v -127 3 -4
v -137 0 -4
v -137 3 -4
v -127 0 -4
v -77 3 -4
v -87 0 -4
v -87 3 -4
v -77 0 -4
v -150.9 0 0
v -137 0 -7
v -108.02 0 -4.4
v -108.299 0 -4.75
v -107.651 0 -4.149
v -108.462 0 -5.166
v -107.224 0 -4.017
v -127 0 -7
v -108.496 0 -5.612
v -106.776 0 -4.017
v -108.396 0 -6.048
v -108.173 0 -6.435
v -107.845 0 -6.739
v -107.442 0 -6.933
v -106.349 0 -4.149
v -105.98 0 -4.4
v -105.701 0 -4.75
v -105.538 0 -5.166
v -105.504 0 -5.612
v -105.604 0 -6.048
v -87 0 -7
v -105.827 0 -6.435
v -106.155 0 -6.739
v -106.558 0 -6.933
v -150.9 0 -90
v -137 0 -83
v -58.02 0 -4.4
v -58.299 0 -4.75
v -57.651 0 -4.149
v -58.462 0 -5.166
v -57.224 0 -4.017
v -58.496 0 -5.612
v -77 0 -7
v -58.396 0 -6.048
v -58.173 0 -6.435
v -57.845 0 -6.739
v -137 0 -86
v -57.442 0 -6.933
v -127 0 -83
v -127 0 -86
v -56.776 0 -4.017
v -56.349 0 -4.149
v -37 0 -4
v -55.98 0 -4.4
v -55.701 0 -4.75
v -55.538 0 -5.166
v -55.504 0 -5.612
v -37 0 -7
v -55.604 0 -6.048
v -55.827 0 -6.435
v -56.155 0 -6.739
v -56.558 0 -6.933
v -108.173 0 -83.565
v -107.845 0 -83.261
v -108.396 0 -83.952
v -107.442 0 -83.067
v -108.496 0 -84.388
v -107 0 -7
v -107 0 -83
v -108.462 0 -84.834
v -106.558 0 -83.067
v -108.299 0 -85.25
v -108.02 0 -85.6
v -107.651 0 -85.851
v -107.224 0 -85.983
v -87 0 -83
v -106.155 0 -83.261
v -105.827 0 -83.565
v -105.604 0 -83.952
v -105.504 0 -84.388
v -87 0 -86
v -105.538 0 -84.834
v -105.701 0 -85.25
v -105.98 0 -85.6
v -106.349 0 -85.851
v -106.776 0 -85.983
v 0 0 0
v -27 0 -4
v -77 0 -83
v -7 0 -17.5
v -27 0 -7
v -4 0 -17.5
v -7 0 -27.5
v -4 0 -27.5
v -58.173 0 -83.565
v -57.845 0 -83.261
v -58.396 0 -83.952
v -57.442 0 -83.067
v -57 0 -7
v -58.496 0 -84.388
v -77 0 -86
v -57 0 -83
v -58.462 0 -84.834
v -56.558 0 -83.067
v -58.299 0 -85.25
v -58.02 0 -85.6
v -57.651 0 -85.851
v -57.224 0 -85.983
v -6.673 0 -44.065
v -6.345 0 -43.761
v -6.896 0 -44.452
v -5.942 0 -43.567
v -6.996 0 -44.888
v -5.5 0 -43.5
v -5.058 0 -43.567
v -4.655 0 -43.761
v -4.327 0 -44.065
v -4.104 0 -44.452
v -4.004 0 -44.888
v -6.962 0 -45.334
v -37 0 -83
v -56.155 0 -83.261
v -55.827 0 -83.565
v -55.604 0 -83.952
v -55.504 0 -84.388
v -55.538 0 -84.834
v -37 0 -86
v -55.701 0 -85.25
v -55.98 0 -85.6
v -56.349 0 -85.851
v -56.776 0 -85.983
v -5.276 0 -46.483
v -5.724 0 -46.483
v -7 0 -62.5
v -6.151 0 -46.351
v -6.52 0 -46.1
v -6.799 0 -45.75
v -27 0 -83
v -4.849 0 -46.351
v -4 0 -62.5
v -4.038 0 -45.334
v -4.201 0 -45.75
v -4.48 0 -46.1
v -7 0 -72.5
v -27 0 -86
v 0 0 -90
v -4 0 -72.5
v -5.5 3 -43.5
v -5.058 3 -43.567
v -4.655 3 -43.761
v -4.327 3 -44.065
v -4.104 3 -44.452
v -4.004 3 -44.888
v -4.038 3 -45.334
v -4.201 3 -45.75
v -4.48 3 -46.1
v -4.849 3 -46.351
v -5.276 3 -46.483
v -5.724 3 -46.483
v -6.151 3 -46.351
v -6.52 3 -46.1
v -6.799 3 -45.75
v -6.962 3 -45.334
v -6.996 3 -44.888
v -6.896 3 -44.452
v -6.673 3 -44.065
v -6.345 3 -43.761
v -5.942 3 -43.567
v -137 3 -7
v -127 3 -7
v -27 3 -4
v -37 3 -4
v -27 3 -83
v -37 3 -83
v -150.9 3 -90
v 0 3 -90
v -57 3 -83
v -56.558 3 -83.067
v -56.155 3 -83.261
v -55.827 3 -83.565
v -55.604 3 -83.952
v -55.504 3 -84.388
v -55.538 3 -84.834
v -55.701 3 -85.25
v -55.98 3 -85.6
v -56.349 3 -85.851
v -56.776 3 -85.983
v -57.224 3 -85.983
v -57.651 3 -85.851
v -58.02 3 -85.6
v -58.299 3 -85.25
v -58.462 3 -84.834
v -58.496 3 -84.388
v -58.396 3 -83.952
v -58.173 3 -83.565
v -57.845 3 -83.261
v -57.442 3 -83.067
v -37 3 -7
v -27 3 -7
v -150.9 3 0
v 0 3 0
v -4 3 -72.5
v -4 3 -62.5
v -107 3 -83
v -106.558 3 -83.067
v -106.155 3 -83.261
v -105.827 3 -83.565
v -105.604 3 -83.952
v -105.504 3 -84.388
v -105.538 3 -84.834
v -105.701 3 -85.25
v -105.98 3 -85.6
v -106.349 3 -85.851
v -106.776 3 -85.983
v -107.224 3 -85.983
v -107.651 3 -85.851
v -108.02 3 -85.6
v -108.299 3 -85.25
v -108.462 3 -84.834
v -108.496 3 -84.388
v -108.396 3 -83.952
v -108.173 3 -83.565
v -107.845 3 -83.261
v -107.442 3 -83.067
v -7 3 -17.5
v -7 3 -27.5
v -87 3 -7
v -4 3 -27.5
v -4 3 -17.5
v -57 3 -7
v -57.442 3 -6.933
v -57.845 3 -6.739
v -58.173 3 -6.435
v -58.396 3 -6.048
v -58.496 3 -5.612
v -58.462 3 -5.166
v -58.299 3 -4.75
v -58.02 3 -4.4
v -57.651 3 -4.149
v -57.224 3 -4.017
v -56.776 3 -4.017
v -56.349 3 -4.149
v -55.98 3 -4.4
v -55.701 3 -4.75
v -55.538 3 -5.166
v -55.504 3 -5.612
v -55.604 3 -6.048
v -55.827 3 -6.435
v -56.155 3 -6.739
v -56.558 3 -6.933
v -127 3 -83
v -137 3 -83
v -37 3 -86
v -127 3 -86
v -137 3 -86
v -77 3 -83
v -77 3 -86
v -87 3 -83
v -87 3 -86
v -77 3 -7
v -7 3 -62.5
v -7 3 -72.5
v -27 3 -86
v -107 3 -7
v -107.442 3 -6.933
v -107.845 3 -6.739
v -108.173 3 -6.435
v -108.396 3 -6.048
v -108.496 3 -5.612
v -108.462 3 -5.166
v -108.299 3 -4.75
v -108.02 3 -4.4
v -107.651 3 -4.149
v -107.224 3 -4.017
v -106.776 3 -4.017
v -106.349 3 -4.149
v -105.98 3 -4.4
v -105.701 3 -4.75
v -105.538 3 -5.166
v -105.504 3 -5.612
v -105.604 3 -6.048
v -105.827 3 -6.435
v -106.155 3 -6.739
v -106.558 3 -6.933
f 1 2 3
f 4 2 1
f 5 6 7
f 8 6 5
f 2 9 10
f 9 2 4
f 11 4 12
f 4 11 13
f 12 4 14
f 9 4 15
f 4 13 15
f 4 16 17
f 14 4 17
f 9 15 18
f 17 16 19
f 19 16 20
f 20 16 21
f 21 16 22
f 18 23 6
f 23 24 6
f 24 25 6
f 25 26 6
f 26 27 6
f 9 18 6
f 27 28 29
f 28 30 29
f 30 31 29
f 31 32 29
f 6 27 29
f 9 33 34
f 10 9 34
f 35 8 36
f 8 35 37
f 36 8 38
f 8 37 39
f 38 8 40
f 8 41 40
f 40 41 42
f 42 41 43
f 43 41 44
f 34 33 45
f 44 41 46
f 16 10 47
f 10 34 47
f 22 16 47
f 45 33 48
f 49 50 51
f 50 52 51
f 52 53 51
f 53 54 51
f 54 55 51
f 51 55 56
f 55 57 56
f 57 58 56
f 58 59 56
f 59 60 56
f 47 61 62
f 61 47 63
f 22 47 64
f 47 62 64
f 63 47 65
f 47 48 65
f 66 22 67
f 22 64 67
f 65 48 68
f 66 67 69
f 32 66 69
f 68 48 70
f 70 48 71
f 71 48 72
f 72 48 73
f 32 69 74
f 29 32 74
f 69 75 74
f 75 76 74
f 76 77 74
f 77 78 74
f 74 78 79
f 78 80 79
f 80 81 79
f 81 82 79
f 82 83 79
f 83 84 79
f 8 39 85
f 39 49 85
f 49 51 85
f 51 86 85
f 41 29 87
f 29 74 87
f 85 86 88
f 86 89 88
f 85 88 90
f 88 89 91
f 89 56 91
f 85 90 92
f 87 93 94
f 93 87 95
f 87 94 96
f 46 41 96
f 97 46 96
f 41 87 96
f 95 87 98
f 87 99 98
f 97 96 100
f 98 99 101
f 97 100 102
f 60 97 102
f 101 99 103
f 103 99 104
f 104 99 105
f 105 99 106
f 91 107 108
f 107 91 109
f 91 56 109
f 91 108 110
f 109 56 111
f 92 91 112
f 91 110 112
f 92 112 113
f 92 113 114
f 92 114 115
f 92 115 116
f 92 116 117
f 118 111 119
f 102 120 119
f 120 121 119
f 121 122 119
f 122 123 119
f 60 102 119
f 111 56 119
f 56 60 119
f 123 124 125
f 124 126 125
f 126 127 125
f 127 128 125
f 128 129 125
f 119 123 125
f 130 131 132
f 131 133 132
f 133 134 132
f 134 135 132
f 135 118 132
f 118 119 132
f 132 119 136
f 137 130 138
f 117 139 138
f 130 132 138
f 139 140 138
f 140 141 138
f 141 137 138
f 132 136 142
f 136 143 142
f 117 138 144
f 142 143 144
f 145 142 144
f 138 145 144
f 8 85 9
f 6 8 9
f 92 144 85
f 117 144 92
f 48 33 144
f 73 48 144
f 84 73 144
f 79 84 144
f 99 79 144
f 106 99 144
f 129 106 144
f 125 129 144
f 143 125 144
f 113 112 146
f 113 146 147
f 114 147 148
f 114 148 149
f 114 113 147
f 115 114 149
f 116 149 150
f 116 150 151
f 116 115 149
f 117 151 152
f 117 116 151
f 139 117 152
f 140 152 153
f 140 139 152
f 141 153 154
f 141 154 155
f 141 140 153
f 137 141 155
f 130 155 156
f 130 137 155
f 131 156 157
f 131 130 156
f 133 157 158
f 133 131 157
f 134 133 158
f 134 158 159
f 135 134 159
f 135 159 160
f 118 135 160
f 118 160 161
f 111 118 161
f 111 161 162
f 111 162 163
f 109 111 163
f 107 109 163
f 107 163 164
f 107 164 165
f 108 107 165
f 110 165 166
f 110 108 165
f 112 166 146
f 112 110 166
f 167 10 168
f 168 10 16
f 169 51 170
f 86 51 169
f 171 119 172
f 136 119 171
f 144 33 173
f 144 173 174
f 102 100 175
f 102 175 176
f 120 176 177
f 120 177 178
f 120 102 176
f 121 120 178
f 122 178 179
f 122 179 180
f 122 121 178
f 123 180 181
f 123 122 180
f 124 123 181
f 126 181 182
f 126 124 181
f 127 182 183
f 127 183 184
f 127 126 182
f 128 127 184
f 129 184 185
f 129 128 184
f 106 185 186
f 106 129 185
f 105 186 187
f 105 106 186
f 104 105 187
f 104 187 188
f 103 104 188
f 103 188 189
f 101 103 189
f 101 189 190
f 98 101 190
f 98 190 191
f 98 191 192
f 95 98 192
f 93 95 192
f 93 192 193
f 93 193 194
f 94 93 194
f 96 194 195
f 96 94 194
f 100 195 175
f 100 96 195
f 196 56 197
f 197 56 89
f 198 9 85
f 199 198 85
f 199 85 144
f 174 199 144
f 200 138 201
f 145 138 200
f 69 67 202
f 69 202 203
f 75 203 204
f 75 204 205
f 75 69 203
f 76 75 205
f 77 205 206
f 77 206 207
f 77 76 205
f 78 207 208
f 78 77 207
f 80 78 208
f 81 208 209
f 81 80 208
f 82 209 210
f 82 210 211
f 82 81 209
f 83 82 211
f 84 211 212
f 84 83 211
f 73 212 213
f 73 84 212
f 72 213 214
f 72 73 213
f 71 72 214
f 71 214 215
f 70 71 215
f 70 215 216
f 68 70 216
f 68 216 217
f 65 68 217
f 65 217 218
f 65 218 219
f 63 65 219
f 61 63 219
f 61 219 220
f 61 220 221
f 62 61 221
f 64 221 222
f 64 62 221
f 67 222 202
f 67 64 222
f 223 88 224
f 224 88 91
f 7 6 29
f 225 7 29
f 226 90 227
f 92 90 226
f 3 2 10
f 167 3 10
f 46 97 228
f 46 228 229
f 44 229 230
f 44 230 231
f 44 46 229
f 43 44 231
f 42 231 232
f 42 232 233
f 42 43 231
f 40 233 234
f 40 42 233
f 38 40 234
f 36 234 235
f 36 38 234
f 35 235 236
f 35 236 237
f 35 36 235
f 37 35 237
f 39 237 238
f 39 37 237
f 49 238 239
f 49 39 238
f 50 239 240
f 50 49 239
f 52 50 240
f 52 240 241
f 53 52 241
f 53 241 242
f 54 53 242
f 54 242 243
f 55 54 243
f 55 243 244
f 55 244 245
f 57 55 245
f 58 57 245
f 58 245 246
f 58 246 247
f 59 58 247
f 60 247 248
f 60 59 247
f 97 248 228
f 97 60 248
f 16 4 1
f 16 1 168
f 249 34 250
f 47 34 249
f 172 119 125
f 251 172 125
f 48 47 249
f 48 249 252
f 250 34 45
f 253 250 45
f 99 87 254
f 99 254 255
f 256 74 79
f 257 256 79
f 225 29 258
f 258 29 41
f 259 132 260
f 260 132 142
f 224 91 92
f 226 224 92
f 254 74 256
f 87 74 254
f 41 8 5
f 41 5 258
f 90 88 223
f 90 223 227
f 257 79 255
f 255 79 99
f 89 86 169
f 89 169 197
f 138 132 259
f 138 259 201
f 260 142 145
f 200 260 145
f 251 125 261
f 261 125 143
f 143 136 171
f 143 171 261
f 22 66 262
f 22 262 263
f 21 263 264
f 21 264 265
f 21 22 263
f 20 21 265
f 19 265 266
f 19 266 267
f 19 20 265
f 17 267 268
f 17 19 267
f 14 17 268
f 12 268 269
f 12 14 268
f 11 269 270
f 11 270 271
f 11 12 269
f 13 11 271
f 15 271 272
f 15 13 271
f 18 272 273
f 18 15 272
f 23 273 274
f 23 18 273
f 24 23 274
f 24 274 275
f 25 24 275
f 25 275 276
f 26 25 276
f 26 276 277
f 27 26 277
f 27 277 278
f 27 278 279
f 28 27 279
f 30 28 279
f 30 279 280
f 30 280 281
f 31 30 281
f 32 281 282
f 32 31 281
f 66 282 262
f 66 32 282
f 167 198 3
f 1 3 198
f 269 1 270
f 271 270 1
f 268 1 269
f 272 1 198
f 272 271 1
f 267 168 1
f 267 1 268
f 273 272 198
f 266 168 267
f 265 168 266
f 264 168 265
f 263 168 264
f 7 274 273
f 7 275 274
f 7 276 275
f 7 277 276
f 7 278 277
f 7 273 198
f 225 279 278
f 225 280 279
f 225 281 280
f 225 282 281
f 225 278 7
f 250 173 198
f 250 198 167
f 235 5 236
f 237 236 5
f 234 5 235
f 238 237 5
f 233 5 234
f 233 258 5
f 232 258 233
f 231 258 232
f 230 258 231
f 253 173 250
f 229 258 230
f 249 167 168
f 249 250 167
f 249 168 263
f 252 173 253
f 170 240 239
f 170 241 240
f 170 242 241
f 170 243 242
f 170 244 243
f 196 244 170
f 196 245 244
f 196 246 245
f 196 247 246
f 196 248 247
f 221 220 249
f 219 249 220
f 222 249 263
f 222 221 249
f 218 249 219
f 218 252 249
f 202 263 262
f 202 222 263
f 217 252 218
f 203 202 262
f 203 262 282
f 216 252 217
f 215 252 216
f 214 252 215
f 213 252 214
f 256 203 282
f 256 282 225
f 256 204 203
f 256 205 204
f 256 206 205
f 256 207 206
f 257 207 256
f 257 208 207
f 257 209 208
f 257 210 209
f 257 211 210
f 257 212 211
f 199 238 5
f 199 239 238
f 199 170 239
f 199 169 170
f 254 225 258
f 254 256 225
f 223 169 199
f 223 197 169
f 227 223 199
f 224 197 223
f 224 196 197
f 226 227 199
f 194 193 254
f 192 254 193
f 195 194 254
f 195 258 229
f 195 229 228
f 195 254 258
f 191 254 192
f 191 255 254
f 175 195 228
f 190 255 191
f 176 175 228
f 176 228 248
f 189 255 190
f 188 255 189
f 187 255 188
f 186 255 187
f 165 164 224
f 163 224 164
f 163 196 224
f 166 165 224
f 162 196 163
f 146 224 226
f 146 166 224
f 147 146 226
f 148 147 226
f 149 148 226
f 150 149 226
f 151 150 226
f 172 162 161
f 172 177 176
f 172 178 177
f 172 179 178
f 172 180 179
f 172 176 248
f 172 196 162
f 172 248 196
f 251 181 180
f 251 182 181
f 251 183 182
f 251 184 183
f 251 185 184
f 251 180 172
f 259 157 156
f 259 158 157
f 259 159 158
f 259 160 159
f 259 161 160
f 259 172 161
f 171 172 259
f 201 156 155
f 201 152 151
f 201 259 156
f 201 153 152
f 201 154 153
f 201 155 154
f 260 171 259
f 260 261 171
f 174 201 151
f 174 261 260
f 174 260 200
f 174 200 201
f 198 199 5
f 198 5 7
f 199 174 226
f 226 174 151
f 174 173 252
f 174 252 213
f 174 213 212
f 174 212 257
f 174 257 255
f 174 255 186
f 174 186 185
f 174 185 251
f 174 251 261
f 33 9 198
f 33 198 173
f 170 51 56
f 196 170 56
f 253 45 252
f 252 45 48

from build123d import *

# Parameters (mm, degrees)
SKETCH1_W           = 150.9
SKETCH1_H           = 90
SKETCH1_R           = 1.5
SKETCH1_W_2         = 10
SKETCH1_H_2         = 3
SKETCH1_W_3         = 3
SKETCH1_H_3         = 10
BOSS_EXTRUDE1_DEPTH = 3


with BuildPart() as part:
    # Sketch1 → Boss-Extrude1 (new body)
    with BuildSketch(Plane(origin=(0, 0, 0), x_dir=(1, 0, 0), z_dir=(0, 1, 0))):
        with Locations((-75.45, 45)):
            Rectangle(SKETCH1_W, SKETCH1_H)
        with Locations(Location((-57, 84.5, 0), (0, 0, 270))):
            Circle(SKETCH1_R, mode=Mode.SUBTRACT)
        with Locations(Location((-107, 84.5, 0), (0, 0, 270))):
            Circle(SKETCH1_R, mode=Mode.SUBTRACT)
        with Locations(Location((-107, 5.5, 0), (0, 0, 90))):
            Circle(SKETCH1_R, mode=Mode.SUBTRACT)
        with Locations(Location((-57, 5.5, 0), (0, 0, 90))):
            Circle(SKETCH1_R, mode=Mode.SUBTRACT)
        with Locations(Location((-5.5, 45, 0), (0, 0, 270))):
            Circle(SKETCH1_R, mode=Mode.SUBTRACT)
        with Locations((-32, 84.5)):
            Rectangle(SKETCH1_W_2, SKETCH1_H_2, mode=Mode.SUBTRACT)
        with Locations((-82, 84.5)):
            Rectangle(SKETCH1_W_2, SKETCH1_H_2, mode=Mode.SUBTRACT)
        with Locations((-132, 84.5)):
            Rectangle(SKETCH1_W_2, SKETCH1_H_2, mode=Mode.SUBTRACT)
        with Locations((-132, 5.5)):
            Rectangle(SKETCH1_W_2, SKETCH1_H_2, mode=Mode.SUBTRACT)
        with Locations((-82, 5.5)):
            Rectangle(SKETCH1_W_2, SKETCH1_H_2, mode=Mode.SUBTRACT)
        with Locations((-32, 5.5)):
            Rectangle(SKETCH1_W_2, SKETCH1_H_2, mode=Mode.SUBTRACT)
        with Locations((-5.5, 67.5)):
            Rectangle(SKETCH1_W_3, SKETCH1_H_3, mode=Mode.SUBTRACT)
        with Locations((-5.5, 22.5)):
            Rectangle(SKETCH1_W_3, SKETCH1_H_3, mode=Mode.SUBTRACT)
    extrude(amount=BOSS_EXTRUDE1_DEPTH)


solid = part.part
